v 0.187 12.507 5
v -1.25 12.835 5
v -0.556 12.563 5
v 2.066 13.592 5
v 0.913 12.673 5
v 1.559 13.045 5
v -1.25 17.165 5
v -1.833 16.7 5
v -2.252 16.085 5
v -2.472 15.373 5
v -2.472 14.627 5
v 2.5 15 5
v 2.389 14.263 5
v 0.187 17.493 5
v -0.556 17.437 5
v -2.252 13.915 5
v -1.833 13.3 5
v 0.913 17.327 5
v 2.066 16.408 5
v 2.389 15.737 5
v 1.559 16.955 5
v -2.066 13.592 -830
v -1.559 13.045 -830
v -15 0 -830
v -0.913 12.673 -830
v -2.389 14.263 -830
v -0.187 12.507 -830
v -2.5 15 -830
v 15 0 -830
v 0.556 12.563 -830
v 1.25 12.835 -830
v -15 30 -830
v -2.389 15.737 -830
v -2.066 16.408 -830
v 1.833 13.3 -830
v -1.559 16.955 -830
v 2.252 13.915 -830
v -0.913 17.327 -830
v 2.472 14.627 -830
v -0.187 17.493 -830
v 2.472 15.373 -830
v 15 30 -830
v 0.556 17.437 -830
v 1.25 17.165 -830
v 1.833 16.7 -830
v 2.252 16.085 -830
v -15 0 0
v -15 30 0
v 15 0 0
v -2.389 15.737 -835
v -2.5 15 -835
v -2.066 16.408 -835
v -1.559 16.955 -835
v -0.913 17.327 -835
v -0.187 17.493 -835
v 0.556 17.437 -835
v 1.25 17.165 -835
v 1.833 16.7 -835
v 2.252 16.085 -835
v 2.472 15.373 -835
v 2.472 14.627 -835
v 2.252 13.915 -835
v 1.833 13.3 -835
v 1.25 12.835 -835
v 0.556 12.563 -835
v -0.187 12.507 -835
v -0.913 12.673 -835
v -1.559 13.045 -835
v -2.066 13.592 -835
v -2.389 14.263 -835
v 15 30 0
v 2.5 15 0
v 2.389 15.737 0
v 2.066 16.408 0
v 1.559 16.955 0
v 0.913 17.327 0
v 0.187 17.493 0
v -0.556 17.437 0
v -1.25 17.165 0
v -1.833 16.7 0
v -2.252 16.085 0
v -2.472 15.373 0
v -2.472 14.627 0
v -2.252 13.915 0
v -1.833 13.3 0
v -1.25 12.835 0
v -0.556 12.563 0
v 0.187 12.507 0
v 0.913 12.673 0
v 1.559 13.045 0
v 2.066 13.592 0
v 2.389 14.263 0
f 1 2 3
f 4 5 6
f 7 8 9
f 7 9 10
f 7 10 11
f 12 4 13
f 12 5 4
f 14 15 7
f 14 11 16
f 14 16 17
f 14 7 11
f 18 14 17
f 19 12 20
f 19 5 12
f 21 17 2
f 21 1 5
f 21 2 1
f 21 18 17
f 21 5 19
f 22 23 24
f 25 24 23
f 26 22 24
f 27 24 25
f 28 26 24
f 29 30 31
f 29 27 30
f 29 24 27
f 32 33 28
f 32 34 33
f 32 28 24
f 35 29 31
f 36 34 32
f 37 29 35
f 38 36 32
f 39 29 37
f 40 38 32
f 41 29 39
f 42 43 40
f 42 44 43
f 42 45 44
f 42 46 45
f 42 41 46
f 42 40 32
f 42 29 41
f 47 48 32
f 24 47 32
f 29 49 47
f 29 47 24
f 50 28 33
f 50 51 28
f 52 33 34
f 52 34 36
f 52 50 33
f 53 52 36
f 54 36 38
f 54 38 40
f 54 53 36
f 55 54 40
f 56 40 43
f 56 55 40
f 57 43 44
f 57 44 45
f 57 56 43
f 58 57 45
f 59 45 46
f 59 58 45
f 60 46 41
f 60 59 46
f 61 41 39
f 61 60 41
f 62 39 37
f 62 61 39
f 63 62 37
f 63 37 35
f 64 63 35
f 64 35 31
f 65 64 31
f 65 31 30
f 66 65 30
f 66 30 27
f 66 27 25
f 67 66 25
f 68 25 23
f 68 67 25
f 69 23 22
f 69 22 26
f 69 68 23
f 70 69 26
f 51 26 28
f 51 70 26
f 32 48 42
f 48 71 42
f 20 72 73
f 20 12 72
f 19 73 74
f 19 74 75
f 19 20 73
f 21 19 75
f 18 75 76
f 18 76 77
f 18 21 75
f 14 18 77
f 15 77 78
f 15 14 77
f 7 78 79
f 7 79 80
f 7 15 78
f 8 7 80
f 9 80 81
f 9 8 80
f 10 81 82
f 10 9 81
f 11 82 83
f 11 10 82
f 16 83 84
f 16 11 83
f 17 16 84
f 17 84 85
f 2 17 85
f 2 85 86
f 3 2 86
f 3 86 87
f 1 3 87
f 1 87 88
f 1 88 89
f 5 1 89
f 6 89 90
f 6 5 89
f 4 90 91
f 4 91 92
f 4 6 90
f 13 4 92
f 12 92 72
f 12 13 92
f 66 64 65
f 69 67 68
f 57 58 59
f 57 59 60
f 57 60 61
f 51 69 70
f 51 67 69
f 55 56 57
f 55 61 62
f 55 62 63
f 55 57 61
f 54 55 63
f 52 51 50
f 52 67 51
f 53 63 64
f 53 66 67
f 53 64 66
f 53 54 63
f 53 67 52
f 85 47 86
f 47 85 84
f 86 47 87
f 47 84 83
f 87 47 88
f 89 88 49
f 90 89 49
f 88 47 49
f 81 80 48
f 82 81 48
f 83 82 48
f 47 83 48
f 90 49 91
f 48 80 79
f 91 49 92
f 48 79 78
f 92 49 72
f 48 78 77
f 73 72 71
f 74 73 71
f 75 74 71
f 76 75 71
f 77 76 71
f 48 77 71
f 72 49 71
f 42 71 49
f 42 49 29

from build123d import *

# Parameters (mm, degrees)
SKETCH1_W           = 830
SKETCH1_H           = 30
BOSS_EXTRUDE1_DEPTH = 15
SKETCH3_R           = 2.5
BOSS_EXTRUDE2_DEPTH = 5
SKETCH4_R           = 2.5
BOSS_EXTRUDE3_DEPTH = 5


with BuildPart() as part:
    # Sketch1 → Boss-Extrude1 (new body, symmetric)
    with BuildSketch(Plane(origin=(0, 0, 0), x_dir=(0, 0, -1), z_dir=(1, 0, 0))):
        with Locations((415, 15)):
            Rectangle(SKETCH1_W, SKETCH1_H)
    extrude(amount=BOSS_EXTRUDE1_DEPTH, both=True)

    # Sketch3 → Boss-Extrude2 (add, symmetric)
    with BuildSketch(Plane(origin=(0, 0, -830), x_dir=(-1, 0, 0), z_dir=(0, 0, -1))):
        with Locations((0, 15)):
            Circle(SKETCH3_R)
    extrude(amount=BOSS_EXTRUDE2_DEPTH, both=True)

    # Sketch4 → Boss-Extrude3 (add, symmetric)
    with BuildSketch(Plane.XY):
        with Locations((0, 15)):
            Circle(SKETCH4_R)
    extrude(amount=BOSS_EXTRUDE3_DEPTH, both=True)


solid = part.part
